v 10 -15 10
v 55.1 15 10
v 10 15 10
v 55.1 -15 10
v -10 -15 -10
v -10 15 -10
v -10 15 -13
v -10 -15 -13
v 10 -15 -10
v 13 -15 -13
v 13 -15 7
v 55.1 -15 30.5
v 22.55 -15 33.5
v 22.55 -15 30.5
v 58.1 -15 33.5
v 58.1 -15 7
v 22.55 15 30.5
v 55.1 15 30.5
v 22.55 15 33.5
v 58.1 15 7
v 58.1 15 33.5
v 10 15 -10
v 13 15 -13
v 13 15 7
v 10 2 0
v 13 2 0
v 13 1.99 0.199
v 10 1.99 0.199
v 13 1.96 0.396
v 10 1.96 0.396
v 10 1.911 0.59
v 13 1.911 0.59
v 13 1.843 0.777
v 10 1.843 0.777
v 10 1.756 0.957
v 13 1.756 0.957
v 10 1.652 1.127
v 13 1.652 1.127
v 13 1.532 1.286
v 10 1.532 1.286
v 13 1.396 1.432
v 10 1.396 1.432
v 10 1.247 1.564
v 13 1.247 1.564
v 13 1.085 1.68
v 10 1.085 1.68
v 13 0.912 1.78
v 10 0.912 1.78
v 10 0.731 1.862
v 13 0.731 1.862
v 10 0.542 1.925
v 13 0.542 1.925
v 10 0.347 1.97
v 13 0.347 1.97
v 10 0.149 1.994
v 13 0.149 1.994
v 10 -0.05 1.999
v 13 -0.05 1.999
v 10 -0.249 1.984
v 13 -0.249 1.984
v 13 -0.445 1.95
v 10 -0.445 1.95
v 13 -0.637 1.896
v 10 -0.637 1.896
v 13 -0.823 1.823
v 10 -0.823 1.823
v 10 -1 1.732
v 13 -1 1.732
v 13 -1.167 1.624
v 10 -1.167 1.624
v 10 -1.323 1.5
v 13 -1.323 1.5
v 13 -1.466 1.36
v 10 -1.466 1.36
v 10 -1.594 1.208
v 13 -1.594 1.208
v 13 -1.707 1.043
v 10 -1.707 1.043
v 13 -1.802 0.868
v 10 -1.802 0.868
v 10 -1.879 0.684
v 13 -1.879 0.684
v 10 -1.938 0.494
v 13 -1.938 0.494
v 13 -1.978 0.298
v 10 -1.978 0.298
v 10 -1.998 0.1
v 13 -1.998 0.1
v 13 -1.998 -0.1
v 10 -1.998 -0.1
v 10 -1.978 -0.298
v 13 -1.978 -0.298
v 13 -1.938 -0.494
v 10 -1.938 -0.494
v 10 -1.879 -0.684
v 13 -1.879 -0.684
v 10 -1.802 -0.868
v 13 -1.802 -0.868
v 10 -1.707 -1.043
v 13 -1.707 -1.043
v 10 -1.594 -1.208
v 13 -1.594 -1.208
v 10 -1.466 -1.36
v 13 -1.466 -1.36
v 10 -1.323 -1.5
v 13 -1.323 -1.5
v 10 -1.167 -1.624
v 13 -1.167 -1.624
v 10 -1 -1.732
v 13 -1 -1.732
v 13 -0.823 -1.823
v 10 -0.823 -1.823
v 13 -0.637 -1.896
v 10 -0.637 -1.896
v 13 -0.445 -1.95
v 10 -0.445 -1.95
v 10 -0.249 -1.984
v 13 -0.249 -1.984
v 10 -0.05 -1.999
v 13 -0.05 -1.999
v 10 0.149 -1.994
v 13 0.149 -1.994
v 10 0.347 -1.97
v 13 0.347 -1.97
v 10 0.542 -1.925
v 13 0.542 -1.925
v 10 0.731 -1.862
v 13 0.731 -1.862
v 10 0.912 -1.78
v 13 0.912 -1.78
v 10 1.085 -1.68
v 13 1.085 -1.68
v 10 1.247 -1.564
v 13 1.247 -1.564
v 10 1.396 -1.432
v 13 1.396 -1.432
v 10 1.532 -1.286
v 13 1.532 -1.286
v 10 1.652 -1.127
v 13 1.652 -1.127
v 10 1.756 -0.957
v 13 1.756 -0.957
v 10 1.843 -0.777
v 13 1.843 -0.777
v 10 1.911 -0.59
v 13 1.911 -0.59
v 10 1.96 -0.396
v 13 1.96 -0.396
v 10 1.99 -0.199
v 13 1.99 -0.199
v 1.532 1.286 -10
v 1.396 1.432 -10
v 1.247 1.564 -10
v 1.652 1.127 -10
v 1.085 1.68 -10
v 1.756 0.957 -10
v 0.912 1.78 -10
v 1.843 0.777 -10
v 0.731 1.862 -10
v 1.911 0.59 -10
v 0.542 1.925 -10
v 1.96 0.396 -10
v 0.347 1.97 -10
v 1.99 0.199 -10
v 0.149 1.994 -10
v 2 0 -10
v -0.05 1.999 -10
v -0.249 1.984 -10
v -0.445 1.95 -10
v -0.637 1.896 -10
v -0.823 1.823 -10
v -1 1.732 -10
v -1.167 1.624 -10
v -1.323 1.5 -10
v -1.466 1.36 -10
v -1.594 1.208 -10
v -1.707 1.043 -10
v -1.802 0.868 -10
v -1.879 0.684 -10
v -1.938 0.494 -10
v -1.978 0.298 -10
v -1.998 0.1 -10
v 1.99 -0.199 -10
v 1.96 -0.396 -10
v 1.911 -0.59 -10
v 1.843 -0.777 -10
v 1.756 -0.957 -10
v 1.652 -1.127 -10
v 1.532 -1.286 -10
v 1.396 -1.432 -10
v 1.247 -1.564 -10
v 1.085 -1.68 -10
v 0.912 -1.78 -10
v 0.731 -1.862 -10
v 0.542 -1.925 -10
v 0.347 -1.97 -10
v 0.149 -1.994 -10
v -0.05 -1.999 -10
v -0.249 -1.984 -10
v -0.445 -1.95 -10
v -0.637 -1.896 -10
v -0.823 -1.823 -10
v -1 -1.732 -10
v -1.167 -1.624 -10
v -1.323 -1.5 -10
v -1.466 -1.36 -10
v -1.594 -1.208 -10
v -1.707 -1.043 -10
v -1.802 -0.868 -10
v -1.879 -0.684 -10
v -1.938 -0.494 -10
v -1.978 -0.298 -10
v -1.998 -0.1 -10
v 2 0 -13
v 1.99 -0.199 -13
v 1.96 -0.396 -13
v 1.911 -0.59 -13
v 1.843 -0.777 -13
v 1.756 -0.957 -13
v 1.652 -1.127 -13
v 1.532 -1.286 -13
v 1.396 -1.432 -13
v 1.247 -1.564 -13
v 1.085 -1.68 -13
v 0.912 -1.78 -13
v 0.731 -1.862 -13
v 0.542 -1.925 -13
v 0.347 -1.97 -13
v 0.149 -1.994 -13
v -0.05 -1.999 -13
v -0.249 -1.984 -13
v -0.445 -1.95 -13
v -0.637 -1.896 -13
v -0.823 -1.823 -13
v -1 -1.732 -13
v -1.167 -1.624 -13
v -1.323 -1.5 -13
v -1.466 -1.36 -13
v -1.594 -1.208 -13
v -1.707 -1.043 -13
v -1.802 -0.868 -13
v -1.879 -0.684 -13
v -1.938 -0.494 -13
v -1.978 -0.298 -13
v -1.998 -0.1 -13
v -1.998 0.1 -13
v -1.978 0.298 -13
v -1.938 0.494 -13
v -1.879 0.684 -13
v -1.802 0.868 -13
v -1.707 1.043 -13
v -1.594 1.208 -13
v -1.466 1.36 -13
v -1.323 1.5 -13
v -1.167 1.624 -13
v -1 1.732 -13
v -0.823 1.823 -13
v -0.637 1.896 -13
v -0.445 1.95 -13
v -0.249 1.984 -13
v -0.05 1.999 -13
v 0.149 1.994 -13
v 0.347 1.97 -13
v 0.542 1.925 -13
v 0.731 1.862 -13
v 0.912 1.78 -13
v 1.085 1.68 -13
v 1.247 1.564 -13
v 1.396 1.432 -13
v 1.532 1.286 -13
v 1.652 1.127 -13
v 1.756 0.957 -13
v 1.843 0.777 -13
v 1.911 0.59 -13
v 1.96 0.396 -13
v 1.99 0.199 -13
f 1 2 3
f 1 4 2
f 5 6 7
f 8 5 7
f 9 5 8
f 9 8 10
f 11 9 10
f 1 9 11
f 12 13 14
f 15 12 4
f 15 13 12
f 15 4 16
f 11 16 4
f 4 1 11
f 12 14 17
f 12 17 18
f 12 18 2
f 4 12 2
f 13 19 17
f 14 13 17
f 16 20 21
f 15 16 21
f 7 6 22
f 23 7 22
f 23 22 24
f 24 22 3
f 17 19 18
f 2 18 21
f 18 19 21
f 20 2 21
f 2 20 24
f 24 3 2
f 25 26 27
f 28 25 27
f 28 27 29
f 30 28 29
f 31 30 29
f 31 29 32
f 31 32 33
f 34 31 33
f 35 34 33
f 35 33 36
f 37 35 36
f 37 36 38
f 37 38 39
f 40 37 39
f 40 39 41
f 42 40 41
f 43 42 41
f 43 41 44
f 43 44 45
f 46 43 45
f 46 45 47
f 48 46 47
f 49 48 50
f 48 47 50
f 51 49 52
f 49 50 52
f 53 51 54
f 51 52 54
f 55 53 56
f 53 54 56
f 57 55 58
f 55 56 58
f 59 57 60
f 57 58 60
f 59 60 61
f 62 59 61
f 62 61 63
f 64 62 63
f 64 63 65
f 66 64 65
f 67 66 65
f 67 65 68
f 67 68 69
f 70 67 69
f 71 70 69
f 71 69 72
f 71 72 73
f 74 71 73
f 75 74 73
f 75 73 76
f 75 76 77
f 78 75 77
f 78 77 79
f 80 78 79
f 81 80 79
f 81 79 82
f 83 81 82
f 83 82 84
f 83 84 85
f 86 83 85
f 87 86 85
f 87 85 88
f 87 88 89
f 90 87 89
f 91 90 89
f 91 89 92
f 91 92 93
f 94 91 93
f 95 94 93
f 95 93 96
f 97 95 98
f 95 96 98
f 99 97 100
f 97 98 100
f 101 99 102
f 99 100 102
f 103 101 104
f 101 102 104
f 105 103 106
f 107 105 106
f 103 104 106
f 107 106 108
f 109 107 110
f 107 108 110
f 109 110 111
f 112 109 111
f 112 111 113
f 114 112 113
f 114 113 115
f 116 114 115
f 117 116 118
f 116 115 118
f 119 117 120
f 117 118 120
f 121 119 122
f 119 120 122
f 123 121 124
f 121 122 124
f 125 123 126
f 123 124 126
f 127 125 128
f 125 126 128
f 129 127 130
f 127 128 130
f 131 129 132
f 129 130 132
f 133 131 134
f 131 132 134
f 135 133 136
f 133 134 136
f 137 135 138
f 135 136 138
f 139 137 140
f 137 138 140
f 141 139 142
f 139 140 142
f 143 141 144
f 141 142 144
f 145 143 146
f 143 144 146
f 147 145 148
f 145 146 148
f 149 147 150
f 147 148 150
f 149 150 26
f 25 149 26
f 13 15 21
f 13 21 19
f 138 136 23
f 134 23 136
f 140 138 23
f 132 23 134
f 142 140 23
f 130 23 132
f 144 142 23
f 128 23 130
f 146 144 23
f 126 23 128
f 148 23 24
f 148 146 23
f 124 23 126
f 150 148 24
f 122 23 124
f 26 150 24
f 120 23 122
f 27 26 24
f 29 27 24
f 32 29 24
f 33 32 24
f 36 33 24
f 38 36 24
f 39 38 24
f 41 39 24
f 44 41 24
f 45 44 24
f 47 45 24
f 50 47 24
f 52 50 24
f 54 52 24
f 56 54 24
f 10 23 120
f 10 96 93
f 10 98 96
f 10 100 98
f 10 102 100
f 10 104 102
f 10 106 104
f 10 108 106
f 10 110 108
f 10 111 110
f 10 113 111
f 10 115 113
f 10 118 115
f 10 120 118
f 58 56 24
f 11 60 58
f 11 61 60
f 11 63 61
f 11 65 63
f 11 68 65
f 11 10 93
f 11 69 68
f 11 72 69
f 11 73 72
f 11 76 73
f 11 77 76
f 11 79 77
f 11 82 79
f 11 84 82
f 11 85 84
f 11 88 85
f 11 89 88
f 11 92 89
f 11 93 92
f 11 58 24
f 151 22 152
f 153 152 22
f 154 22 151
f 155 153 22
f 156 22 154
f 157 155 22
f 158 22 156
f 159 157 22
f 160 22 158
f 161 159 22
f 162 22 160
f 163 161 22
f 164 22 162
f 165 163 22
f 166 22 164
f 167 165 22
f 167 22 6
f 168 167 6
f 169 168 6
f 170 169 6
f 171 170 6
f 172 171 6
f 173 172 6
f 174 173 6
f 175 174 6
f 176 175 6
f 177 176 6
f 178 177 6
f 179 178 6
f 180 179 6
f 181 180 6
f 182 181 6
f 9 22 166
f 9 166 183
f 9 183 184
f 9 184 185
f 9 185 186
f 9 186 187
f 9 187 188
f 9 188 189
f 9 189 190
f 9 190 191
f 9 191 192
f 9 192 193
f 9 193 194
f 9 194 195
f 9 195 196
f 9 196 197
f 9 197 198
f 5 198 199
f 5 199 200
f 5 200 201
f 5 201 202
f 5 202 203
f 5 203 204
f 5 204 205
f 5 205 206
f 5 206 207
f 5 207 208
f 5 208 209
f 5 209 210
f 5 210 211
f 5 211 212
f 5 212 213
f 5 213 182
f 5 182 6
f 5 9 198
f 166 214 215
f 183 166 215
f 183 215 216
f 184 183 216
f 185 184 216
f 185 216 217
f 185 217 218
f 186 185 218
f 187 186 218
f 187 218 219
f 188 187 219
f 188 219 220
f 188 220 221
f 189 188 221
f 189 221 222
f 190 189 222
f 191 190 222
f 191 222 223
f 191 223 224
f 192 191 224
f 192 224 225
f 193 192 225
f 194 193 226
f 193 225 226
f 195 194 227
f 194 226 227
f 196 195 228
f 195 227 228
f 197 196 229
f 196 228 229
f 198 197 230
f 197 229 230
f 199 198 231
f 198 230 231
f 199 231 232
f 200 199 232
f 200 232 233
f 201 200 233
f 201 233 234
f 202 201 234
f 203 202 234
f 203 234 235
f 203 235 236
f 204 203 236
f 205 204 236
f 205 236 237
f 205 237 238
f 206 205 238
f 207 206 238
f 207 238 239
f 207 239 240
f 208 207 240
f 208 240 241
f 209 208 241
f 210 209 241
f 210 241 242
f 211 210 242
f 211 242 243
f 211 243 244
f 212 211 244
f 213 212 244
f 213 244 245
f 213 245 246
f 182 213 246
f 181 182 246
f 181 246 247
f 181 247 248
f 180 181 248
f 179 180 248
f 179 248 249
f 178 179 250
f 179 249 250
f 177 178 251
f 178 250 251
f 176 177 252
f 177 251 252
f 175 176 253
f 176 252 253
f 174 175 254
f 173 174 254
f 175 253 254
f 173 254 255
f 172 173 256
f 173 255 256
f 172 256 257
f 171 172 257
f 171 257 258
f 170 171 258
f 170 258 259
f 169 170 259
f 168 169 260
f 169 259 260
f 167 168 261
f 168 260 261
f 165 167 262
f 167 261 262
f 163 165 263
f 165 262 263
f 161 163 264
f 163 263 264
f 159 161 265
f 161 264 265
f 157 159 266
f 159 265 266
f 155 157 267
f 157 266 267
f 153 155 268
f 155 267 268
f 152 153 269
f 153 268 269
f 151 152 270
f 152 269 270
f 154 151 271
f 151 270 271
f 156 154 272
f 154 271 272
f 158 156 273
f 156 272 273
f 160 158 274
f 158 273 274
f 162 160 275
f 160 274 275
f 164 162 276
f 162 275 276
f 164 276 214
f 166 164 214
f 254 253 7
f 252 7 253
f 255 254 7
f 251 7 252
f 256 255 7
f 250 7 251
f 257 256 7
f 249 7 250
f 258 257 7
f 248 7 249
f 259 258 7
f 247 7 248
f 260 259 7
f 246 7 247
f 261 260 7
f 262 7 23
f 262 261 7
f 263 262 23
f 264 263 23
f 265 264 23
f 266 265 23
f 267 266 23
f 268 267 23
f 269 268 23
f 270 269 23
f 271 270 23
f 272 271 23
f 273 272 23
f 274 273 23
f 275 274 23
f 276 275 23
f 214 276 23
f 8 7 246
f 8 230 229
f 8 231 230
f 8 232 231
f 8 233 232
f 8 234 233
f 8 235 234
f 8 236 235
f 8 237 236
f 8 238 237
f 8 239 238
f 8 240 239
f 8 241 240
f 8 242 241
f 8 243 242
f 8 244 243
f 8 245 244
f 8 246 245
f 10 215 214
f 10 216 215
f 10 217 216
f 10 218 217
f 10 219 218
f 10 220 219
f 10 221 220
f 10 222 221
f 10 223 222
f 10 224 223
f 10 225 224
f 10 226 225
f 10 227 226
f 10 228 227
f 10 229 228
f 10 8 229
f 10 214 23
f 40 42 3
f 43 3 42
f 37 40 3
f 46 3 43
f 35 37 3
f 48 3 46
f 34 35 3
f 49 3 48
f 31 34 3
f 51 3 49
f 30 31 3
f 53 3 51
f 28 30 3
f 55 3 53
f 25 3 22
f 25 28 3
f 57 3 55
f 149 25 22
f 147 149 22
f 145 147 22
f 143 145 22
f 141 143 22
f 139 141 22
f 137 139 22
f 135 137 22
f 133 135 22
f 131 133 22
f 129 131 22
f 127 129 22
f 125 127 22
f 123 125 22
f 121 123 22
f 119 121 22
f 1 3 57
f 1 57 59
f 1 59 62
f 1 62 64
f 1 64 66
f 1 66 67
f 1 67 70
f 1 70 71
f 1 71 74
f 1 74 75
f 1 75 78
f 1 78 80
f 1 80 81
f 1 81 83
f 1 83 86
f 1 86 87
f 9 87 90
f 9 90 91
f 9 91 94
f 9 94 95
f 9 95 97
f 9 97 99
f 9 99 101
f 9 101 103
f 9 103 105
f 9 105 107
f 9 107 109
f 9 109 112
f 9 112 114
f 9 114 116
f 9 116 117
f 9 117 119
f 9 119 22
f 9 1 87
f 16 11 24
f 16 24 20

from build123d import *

# Parameters (mm, degrees)
F1_DEPTH      = 15
F1_DEPTH_BACK = 15
F2_R          = 2
F3_DEPTH      = 5
F3_DEPTH_BACK = 5
F4_R          = 2
F5_DEPTH      = 5
F5_DEPTH_BACK = 5


with BuildPart() as f1:
    # F0 (on Front) → F1 (new body, two sides)
    with BuildSketch(Plane.XZ) as f1_sk:
        Polygon((10, -10), (-10, -10), (-10, -13), (13, -13), (13, 7), (58.1, 7), (58.1, 33.5), (22.55, 33.5), (22.55, 30.5), (55.1, 30.5), (55.1, 10), (10, 10), align=None)
    extrude(amount=F1_DEPTH)
    extrude(f1_sk.sketch, amount=-F1_DEPTH_BACK)

    # F2 (on face) → F3 (cut, two sides)
    with BuildSketch(Plane.YZ.offset(13)) as f3_sk:
        Circle(F2_R)
    extrude(amount=-F3_DEPTH, mode=Mode.SUBTRACT)
    extrude(f3_sk.sketch, amount=-F3_DEPTH_BACK, mode=Mode.SUBTRACT)

    # F4 (on face) → F5 (cut, two sides)
    with BuildSketch(Plane(origin=(0, 0, -13), x_dir=(1, 0, 0), z_dir=(0, 0, -1))) as f5_sk:
        Circle(F4_R)
    extrude(amount=-F5_DEPTH, mode=Mode.SUBTRACT)
    extrude(f5_sk.sketch, amount=-F5_DEPTH_BACK, mode=Mode.SUBTRACT)


solid = f1.part
